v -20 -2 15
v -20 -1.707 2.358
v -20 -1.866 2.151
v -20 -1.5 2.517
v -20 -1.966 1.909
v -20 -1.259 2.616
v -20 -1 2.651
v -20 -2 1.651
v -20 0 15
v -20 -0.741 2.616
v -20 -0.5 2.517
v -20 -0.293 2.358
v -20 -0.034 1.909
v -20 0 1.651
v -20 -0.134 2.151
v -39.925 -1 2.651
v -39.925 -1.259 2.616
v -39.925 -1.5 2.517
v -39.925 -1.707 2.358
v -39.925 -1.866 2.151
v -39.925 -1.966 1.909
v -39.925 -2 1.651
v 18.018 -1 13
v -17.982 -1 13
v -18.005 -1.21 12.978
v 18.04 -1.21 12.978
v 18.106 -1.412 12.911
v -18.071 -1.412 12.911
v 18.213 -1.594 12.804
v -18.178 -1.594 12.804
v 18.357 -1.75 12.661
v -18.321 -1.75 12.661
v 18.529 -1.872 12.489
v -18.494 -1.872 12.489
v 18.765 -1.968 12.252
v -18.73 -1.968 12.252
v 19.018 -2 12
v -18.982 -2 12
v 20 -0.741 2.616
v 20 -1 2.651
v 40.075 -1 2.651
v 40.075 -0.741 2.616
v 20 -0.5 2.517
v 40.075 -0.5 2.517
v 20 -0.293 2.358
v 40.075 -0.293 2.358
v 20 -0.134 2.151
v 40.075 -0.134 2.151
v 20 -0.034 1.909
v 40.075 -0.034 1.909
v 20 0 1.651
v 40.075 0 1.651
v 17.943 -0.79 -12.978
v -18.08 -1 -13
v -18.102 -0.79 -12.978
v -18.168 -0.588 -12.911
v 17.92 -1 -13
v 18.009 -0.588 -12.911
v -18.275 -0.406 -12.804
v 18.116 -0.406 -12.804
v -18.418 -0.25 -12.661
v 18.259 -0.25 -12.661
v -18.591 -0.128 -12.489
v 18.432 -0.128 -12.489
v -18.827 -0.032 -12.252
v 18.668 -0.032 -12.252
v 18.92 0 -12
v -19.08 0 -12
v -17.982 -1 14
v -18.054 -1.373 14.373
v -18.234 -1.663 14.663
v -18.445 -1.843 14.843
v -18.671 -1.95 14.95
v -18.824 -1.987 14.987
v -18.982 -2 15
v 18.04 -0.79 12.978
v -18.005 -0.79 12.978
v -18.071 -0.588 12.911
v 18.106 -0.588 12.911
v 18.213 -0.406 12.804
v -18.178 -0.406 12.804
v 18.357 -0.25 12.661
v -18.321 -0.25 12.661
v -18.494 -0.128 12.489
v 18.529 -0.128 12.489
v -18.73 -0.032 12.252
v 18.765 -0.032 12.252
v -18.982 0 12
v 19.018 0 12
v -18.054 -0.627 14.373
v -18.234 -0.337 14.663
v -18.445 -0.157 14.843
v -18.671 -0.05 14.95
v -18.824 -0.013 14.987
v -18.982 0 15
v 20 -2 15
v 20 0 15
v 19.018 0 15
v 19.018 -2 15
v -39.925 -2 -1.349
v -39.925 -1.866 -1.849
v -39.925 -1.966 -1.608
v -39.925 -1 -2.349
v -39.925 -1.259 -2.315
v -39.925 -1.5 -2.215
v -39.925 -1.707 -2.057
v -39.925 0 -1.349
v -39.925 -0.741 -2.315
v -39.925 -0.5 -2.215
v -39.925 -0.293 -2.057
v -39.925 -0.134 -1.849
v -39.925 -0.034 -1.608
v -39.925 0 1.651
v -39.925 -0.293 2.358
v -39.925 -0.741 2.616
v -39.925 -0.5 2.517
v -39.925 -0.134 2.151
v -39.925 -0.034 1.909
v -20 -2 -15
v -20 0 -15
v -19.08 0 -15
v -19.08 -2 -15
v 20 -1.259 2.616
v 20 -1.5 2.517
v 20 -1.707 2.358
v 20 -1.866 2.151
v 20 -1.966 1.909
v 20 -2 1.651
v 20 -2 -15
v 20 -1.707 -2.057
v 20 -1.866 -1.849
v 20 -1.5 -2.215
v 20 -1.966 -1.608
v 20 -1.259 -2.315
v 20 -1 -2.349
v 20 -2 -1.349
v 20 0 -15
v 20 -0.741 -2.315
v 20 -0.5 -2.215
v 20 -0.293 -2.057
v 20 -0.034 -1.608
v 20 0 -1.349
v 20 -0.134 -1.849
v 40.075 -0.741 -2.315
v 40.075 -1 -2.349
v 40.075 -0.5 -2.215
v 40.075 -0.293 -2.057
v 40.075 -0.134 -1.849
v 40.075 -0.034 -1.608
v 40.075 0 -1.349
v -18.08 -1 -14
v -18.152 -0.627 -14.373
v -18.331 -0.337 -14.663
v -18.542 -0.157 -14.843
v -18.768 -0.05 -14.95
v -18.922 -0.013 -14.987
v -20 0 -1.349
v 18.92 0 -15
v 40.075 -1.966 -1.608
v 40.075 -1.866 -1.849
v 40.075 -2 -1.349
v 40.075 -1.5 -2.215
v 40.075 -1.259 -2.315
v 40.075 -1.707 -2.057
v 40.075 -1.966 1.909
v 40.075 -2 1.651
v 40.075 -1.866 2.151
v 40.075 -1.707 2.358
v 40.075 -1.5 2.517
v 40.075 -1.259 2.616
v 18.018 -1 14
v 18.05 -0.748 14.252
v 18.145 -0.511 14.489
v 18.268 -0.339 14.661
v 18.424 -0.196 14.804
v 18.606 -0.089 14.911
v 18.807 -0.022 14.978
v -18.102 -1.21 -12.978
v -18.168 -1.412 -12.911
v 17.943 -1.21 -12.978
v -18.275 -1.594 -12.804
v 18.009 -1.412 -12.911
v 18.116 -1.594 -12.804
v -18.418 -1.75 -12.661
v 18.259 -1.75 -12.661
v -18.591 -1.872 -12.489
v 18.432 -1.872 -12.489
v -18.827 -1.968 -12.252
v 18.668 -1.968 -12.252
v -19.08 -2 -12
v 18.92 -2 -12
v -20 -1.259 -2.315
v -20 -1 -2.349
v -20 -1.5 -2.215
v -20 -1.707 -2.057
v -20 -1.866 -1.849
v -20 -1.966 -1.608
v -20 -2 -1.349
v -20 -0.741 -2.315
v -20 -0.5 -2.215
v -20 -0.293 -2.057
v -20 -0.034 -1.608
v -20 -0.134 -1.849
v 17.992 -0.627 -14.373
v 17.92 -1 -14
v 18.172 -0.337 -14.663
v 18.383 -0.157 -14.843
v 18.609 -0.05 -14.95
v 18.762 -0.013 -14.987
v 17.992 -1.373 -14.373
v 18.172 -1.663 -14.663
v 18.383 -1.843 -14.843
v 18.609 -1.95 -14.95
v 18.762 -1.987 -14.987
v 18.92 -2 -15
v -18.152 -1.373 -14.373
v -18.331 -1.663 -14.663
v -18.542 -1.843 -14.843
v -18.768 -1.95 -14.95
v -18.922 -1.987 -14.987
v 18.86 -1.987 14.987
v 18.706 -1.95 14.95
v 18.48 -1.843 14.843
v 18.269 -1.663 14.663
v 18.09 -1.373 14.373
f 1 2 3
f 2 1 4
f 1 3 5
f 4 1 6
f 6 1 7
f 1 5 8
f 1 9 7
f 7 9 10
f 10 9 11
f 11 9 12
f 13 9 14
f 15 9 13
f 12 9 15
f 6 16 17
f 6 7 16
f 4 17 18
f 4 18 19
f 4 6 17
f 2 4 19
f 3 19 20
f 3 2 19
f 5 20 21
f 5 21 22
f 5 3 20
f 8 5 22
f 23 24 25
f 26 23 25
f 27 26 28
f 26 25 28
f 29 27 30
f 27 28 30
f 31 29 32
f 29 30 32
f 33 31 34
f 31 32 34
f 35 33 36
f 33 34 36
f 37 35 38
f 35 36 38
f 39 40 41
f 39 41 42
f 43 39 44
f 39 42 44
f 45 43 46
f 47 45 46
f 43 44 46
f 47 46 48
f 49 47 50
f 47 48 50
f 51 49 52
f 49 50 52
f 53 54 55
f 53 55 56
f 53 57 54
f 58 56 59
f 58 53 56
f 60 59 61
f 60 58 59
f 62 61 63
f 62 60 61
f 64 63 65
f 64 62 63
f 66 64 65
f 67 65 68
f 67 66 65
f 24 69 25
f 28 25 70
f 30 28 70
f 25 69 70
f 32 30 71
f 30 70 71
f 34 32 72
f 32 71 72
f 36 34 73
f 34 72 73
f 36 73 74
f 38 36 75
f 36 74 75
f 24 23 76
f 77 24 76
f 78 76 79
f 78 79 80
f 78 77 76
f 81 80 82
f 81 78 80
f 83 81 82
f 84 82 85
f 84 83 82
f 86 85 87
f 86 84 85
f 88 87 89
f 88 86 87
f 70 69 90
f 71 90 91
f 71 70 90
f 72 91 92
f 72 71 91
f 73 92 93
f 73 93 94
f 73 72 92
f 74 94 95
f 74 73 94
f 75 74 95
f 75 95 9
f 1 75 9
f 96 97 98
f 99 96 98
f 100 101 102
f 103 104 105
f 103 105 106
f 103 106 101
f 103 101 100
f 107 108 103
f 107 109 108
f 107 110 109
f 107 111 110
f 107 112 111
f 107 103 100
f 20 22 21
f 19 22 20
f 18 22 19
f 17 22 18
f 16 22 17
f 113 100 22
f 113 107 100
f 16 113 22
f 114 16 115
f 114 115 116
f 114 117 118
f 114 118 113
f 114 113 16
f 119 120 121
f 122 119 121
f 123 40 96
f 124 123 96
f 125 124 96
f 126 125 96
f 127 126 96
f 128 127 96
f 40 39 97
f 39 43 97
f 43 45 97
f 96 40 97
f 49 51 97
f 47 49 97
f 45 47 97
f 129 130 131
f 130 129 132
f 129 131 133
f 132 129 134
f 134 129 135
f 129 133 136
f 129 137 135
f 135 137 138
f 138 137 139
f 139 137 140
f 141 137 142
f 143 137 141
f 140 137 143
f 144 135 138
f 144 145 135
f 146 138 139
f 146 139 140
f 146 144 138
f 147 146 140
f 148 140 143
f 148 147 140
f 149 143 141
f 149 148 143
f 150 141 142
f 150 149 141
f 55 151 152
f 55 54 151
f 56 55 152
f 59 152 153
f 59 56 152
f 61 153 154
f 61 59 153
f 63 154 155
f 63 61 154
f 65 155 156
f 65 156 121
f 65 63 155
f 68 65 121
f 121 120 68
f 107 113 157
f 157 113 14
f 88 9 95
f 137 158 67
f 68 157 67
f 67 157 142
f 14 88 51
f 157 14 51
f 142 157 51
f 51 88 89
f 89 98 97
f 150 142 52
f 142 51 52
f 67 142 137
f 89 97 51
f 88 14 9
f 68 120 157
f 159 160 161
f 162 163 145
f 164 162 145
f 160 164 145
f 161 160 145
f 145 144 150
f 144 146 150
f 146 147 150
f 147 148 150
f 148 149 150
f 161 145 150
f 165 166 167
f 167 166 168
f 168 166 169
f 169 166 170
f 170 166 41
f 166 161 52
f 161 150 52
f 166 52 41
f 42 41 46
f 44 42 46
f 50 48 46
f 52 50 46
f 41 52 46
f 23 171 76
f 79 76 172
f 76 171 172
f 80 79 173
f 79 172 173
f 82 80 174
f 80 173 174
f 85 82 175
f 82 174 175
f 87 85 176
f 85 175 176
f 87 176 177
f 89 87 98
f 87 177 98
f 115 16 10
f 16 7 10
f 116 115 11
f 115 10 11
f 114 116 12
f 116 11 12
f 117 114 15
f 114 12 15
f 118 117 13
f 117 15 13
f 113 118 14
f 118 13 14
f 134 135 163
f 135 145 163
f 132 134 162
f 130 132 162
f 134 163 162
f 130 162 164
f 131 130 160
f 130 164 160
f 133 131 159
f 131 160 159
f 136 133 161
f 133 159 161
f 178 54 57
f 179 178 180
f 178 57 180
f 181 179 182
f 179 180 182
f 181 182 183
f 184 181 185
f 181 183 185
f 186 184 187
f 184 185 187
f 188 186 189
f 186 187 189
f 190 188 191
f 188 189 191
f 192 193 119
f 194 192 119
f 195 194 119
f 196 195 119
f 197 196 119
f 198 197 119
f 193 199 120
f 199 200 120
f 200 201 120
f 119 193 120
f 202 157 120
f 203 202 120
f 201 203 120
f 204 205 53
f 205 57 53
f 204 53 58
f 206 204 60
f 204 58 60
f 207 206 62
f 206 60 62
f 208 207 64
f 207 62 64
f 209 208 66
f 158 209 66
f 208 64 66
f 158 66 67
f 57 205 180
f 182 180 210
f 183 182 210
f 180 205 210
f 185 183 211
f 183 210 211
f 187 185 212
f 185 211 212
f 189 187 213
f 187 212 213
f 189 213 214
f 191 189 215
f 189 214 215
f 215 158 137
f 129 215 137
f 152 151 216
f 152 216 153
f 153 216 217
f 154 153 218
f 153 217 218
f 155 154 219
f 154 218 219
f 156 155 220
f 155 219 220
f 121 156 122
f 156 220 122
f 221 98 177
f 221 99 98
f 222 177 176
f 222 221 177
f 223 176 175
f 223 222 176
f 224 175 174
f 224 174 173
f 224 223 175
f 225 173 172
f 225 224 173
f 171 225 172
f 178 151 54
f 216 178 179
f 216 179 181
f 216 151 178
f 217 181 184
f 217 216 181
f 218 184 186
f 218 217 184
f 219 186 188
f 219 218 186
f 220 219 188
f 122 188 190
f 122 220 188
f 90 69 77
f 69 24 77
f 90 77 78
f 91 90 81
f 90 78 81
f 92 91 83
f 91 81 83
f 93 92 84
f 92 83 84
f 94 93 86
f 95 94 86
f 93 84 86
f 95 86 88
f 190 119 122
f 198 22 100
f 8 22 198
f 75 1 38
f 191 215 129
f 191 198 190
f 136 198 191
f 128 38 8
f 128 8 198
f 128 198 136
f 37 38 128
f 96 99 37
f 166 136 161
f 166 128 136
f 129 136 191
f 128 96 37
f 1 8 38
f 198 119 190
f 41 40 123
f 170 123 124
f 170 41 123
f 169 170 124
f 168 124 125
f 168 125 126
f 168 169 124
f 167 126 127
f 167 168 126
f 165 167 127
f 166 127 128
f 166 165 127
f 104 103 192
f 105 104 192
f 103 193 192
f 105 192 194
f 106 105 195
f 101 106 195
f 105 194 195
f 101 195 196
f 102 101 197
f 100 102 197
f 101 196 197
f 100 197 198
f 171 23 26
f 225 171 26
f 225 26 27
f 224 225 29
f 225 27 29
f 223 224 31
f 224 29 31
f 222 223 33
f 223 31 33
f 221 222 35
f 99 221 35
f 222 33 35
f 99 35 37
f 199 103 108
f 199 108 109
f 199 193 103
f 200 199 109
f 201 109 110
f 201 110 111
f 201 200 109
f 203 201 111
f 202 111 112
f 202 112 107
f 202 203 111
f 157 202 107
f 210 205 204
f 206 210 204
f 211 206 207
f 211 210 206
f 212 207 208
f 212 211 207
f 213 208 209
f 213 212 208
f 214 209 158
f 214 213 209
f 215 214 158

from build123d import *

# Parameters (mm, degrees)
F0_W     = 40
F0_H     = 5
F0_W_2   = 20.0747972727
F0_W_3   = 19.9252027273
F1_DEPTH = 2
F2_R     = 0.99999
F3_R     = 0.99999
F4_R     = 0.99999


# Not quite as in the source:
# - a fillet or chamfer is up to 0.001 mm smaller than in the source, because OpenCascade refuses the exact size


with BuildPart() as f1:
    # F0 (on Front) → F1 (new body)
    with BuildSketch(Plane.XZ):
        Polygon((-17.9821681231, 15), (-20, 15), (-20, 2.6505640079), (20, 2.6505640079), (20, 15), (18.0178318769, 15), (18.0178318769, 13), (-17.9821681231, 13), align=None)
        with Locations((0, 0.1505640079)):
            Rectangle(F0_W, F0_H)
        with Locations((30.0373986363, 0.1505640079)):
            Rectangle(F0_W_2, F0_H)
        with Locations((-29.9626013637, 0.1505640079)):
            Rectangle(F0_W_3, F0_H)
        Polygon((20, -2.3494359921), (-20, -2.3494359921), (-20, -15), (-18.0797521025, -15), (-18.0797521025, -13), (17.9202478975, -13), (17.9202478975, -15), (20, -15), align=None)
    extrude(amount=F1_DEPTH)

    # F2 (radius 1 in the source; OpenCascade refuses exactly that, so slightly less here)
    f2_edges = [f1.edges().sort_by_distance(p)[0] for p in [
        (30.037399, -2, -2.349436),
        (30.037399, 0, -2.349436),
        (30.037399, -2, 2.650564),
        (-29.962601, 0, 2.650564),
        (-29.962601, -2, 2.650564),
        (-29.962601, 0, -2.349436),
        (30.037399, 0, 2.650564),
        (-29.962601, -2, -2.349436),
    ]]
    fillet(f2_edges, radius=F2_R)

    # F3 (radius 1 in the source; OpenCascade refuses exactly that, so slightly less here)
    f3_edges = [f1.edges().sort_by_distance(p)[0] for p in [
        (-0.079752, -2, -13),
        (-0.079752, 0, -13),
        (0.017832, 0, 13),
        (0.017832, -2, 13),
    ]]
    fillet(f3_edges, radius=F3_R)

    # F4 (radius 1 in the source; OpenCascade refuses exactly that, so slightly less here)
    f4_edges = [f1.edges().sort_by_distance(p)[0] for p in [
        (18.017832, -2, 14),
        (18.017832, -1, 15),
        (18.017832, 0, 14),
        (-17.982168, -2, 14),
        (-17.982168, -1, 15),
        (-18.079752, -2, -14),
        (17.920248, -2, -14),
        (-17.982168, 0, 14),
        (-18.079752, 0, -14),
        (-18.079752, -1, -15),
        (17.920248, 0, -14),
        (17.920248, -1, -15),
    ]]
    fillet(f4_edges, radius=F4_R)


solid = f1.part
